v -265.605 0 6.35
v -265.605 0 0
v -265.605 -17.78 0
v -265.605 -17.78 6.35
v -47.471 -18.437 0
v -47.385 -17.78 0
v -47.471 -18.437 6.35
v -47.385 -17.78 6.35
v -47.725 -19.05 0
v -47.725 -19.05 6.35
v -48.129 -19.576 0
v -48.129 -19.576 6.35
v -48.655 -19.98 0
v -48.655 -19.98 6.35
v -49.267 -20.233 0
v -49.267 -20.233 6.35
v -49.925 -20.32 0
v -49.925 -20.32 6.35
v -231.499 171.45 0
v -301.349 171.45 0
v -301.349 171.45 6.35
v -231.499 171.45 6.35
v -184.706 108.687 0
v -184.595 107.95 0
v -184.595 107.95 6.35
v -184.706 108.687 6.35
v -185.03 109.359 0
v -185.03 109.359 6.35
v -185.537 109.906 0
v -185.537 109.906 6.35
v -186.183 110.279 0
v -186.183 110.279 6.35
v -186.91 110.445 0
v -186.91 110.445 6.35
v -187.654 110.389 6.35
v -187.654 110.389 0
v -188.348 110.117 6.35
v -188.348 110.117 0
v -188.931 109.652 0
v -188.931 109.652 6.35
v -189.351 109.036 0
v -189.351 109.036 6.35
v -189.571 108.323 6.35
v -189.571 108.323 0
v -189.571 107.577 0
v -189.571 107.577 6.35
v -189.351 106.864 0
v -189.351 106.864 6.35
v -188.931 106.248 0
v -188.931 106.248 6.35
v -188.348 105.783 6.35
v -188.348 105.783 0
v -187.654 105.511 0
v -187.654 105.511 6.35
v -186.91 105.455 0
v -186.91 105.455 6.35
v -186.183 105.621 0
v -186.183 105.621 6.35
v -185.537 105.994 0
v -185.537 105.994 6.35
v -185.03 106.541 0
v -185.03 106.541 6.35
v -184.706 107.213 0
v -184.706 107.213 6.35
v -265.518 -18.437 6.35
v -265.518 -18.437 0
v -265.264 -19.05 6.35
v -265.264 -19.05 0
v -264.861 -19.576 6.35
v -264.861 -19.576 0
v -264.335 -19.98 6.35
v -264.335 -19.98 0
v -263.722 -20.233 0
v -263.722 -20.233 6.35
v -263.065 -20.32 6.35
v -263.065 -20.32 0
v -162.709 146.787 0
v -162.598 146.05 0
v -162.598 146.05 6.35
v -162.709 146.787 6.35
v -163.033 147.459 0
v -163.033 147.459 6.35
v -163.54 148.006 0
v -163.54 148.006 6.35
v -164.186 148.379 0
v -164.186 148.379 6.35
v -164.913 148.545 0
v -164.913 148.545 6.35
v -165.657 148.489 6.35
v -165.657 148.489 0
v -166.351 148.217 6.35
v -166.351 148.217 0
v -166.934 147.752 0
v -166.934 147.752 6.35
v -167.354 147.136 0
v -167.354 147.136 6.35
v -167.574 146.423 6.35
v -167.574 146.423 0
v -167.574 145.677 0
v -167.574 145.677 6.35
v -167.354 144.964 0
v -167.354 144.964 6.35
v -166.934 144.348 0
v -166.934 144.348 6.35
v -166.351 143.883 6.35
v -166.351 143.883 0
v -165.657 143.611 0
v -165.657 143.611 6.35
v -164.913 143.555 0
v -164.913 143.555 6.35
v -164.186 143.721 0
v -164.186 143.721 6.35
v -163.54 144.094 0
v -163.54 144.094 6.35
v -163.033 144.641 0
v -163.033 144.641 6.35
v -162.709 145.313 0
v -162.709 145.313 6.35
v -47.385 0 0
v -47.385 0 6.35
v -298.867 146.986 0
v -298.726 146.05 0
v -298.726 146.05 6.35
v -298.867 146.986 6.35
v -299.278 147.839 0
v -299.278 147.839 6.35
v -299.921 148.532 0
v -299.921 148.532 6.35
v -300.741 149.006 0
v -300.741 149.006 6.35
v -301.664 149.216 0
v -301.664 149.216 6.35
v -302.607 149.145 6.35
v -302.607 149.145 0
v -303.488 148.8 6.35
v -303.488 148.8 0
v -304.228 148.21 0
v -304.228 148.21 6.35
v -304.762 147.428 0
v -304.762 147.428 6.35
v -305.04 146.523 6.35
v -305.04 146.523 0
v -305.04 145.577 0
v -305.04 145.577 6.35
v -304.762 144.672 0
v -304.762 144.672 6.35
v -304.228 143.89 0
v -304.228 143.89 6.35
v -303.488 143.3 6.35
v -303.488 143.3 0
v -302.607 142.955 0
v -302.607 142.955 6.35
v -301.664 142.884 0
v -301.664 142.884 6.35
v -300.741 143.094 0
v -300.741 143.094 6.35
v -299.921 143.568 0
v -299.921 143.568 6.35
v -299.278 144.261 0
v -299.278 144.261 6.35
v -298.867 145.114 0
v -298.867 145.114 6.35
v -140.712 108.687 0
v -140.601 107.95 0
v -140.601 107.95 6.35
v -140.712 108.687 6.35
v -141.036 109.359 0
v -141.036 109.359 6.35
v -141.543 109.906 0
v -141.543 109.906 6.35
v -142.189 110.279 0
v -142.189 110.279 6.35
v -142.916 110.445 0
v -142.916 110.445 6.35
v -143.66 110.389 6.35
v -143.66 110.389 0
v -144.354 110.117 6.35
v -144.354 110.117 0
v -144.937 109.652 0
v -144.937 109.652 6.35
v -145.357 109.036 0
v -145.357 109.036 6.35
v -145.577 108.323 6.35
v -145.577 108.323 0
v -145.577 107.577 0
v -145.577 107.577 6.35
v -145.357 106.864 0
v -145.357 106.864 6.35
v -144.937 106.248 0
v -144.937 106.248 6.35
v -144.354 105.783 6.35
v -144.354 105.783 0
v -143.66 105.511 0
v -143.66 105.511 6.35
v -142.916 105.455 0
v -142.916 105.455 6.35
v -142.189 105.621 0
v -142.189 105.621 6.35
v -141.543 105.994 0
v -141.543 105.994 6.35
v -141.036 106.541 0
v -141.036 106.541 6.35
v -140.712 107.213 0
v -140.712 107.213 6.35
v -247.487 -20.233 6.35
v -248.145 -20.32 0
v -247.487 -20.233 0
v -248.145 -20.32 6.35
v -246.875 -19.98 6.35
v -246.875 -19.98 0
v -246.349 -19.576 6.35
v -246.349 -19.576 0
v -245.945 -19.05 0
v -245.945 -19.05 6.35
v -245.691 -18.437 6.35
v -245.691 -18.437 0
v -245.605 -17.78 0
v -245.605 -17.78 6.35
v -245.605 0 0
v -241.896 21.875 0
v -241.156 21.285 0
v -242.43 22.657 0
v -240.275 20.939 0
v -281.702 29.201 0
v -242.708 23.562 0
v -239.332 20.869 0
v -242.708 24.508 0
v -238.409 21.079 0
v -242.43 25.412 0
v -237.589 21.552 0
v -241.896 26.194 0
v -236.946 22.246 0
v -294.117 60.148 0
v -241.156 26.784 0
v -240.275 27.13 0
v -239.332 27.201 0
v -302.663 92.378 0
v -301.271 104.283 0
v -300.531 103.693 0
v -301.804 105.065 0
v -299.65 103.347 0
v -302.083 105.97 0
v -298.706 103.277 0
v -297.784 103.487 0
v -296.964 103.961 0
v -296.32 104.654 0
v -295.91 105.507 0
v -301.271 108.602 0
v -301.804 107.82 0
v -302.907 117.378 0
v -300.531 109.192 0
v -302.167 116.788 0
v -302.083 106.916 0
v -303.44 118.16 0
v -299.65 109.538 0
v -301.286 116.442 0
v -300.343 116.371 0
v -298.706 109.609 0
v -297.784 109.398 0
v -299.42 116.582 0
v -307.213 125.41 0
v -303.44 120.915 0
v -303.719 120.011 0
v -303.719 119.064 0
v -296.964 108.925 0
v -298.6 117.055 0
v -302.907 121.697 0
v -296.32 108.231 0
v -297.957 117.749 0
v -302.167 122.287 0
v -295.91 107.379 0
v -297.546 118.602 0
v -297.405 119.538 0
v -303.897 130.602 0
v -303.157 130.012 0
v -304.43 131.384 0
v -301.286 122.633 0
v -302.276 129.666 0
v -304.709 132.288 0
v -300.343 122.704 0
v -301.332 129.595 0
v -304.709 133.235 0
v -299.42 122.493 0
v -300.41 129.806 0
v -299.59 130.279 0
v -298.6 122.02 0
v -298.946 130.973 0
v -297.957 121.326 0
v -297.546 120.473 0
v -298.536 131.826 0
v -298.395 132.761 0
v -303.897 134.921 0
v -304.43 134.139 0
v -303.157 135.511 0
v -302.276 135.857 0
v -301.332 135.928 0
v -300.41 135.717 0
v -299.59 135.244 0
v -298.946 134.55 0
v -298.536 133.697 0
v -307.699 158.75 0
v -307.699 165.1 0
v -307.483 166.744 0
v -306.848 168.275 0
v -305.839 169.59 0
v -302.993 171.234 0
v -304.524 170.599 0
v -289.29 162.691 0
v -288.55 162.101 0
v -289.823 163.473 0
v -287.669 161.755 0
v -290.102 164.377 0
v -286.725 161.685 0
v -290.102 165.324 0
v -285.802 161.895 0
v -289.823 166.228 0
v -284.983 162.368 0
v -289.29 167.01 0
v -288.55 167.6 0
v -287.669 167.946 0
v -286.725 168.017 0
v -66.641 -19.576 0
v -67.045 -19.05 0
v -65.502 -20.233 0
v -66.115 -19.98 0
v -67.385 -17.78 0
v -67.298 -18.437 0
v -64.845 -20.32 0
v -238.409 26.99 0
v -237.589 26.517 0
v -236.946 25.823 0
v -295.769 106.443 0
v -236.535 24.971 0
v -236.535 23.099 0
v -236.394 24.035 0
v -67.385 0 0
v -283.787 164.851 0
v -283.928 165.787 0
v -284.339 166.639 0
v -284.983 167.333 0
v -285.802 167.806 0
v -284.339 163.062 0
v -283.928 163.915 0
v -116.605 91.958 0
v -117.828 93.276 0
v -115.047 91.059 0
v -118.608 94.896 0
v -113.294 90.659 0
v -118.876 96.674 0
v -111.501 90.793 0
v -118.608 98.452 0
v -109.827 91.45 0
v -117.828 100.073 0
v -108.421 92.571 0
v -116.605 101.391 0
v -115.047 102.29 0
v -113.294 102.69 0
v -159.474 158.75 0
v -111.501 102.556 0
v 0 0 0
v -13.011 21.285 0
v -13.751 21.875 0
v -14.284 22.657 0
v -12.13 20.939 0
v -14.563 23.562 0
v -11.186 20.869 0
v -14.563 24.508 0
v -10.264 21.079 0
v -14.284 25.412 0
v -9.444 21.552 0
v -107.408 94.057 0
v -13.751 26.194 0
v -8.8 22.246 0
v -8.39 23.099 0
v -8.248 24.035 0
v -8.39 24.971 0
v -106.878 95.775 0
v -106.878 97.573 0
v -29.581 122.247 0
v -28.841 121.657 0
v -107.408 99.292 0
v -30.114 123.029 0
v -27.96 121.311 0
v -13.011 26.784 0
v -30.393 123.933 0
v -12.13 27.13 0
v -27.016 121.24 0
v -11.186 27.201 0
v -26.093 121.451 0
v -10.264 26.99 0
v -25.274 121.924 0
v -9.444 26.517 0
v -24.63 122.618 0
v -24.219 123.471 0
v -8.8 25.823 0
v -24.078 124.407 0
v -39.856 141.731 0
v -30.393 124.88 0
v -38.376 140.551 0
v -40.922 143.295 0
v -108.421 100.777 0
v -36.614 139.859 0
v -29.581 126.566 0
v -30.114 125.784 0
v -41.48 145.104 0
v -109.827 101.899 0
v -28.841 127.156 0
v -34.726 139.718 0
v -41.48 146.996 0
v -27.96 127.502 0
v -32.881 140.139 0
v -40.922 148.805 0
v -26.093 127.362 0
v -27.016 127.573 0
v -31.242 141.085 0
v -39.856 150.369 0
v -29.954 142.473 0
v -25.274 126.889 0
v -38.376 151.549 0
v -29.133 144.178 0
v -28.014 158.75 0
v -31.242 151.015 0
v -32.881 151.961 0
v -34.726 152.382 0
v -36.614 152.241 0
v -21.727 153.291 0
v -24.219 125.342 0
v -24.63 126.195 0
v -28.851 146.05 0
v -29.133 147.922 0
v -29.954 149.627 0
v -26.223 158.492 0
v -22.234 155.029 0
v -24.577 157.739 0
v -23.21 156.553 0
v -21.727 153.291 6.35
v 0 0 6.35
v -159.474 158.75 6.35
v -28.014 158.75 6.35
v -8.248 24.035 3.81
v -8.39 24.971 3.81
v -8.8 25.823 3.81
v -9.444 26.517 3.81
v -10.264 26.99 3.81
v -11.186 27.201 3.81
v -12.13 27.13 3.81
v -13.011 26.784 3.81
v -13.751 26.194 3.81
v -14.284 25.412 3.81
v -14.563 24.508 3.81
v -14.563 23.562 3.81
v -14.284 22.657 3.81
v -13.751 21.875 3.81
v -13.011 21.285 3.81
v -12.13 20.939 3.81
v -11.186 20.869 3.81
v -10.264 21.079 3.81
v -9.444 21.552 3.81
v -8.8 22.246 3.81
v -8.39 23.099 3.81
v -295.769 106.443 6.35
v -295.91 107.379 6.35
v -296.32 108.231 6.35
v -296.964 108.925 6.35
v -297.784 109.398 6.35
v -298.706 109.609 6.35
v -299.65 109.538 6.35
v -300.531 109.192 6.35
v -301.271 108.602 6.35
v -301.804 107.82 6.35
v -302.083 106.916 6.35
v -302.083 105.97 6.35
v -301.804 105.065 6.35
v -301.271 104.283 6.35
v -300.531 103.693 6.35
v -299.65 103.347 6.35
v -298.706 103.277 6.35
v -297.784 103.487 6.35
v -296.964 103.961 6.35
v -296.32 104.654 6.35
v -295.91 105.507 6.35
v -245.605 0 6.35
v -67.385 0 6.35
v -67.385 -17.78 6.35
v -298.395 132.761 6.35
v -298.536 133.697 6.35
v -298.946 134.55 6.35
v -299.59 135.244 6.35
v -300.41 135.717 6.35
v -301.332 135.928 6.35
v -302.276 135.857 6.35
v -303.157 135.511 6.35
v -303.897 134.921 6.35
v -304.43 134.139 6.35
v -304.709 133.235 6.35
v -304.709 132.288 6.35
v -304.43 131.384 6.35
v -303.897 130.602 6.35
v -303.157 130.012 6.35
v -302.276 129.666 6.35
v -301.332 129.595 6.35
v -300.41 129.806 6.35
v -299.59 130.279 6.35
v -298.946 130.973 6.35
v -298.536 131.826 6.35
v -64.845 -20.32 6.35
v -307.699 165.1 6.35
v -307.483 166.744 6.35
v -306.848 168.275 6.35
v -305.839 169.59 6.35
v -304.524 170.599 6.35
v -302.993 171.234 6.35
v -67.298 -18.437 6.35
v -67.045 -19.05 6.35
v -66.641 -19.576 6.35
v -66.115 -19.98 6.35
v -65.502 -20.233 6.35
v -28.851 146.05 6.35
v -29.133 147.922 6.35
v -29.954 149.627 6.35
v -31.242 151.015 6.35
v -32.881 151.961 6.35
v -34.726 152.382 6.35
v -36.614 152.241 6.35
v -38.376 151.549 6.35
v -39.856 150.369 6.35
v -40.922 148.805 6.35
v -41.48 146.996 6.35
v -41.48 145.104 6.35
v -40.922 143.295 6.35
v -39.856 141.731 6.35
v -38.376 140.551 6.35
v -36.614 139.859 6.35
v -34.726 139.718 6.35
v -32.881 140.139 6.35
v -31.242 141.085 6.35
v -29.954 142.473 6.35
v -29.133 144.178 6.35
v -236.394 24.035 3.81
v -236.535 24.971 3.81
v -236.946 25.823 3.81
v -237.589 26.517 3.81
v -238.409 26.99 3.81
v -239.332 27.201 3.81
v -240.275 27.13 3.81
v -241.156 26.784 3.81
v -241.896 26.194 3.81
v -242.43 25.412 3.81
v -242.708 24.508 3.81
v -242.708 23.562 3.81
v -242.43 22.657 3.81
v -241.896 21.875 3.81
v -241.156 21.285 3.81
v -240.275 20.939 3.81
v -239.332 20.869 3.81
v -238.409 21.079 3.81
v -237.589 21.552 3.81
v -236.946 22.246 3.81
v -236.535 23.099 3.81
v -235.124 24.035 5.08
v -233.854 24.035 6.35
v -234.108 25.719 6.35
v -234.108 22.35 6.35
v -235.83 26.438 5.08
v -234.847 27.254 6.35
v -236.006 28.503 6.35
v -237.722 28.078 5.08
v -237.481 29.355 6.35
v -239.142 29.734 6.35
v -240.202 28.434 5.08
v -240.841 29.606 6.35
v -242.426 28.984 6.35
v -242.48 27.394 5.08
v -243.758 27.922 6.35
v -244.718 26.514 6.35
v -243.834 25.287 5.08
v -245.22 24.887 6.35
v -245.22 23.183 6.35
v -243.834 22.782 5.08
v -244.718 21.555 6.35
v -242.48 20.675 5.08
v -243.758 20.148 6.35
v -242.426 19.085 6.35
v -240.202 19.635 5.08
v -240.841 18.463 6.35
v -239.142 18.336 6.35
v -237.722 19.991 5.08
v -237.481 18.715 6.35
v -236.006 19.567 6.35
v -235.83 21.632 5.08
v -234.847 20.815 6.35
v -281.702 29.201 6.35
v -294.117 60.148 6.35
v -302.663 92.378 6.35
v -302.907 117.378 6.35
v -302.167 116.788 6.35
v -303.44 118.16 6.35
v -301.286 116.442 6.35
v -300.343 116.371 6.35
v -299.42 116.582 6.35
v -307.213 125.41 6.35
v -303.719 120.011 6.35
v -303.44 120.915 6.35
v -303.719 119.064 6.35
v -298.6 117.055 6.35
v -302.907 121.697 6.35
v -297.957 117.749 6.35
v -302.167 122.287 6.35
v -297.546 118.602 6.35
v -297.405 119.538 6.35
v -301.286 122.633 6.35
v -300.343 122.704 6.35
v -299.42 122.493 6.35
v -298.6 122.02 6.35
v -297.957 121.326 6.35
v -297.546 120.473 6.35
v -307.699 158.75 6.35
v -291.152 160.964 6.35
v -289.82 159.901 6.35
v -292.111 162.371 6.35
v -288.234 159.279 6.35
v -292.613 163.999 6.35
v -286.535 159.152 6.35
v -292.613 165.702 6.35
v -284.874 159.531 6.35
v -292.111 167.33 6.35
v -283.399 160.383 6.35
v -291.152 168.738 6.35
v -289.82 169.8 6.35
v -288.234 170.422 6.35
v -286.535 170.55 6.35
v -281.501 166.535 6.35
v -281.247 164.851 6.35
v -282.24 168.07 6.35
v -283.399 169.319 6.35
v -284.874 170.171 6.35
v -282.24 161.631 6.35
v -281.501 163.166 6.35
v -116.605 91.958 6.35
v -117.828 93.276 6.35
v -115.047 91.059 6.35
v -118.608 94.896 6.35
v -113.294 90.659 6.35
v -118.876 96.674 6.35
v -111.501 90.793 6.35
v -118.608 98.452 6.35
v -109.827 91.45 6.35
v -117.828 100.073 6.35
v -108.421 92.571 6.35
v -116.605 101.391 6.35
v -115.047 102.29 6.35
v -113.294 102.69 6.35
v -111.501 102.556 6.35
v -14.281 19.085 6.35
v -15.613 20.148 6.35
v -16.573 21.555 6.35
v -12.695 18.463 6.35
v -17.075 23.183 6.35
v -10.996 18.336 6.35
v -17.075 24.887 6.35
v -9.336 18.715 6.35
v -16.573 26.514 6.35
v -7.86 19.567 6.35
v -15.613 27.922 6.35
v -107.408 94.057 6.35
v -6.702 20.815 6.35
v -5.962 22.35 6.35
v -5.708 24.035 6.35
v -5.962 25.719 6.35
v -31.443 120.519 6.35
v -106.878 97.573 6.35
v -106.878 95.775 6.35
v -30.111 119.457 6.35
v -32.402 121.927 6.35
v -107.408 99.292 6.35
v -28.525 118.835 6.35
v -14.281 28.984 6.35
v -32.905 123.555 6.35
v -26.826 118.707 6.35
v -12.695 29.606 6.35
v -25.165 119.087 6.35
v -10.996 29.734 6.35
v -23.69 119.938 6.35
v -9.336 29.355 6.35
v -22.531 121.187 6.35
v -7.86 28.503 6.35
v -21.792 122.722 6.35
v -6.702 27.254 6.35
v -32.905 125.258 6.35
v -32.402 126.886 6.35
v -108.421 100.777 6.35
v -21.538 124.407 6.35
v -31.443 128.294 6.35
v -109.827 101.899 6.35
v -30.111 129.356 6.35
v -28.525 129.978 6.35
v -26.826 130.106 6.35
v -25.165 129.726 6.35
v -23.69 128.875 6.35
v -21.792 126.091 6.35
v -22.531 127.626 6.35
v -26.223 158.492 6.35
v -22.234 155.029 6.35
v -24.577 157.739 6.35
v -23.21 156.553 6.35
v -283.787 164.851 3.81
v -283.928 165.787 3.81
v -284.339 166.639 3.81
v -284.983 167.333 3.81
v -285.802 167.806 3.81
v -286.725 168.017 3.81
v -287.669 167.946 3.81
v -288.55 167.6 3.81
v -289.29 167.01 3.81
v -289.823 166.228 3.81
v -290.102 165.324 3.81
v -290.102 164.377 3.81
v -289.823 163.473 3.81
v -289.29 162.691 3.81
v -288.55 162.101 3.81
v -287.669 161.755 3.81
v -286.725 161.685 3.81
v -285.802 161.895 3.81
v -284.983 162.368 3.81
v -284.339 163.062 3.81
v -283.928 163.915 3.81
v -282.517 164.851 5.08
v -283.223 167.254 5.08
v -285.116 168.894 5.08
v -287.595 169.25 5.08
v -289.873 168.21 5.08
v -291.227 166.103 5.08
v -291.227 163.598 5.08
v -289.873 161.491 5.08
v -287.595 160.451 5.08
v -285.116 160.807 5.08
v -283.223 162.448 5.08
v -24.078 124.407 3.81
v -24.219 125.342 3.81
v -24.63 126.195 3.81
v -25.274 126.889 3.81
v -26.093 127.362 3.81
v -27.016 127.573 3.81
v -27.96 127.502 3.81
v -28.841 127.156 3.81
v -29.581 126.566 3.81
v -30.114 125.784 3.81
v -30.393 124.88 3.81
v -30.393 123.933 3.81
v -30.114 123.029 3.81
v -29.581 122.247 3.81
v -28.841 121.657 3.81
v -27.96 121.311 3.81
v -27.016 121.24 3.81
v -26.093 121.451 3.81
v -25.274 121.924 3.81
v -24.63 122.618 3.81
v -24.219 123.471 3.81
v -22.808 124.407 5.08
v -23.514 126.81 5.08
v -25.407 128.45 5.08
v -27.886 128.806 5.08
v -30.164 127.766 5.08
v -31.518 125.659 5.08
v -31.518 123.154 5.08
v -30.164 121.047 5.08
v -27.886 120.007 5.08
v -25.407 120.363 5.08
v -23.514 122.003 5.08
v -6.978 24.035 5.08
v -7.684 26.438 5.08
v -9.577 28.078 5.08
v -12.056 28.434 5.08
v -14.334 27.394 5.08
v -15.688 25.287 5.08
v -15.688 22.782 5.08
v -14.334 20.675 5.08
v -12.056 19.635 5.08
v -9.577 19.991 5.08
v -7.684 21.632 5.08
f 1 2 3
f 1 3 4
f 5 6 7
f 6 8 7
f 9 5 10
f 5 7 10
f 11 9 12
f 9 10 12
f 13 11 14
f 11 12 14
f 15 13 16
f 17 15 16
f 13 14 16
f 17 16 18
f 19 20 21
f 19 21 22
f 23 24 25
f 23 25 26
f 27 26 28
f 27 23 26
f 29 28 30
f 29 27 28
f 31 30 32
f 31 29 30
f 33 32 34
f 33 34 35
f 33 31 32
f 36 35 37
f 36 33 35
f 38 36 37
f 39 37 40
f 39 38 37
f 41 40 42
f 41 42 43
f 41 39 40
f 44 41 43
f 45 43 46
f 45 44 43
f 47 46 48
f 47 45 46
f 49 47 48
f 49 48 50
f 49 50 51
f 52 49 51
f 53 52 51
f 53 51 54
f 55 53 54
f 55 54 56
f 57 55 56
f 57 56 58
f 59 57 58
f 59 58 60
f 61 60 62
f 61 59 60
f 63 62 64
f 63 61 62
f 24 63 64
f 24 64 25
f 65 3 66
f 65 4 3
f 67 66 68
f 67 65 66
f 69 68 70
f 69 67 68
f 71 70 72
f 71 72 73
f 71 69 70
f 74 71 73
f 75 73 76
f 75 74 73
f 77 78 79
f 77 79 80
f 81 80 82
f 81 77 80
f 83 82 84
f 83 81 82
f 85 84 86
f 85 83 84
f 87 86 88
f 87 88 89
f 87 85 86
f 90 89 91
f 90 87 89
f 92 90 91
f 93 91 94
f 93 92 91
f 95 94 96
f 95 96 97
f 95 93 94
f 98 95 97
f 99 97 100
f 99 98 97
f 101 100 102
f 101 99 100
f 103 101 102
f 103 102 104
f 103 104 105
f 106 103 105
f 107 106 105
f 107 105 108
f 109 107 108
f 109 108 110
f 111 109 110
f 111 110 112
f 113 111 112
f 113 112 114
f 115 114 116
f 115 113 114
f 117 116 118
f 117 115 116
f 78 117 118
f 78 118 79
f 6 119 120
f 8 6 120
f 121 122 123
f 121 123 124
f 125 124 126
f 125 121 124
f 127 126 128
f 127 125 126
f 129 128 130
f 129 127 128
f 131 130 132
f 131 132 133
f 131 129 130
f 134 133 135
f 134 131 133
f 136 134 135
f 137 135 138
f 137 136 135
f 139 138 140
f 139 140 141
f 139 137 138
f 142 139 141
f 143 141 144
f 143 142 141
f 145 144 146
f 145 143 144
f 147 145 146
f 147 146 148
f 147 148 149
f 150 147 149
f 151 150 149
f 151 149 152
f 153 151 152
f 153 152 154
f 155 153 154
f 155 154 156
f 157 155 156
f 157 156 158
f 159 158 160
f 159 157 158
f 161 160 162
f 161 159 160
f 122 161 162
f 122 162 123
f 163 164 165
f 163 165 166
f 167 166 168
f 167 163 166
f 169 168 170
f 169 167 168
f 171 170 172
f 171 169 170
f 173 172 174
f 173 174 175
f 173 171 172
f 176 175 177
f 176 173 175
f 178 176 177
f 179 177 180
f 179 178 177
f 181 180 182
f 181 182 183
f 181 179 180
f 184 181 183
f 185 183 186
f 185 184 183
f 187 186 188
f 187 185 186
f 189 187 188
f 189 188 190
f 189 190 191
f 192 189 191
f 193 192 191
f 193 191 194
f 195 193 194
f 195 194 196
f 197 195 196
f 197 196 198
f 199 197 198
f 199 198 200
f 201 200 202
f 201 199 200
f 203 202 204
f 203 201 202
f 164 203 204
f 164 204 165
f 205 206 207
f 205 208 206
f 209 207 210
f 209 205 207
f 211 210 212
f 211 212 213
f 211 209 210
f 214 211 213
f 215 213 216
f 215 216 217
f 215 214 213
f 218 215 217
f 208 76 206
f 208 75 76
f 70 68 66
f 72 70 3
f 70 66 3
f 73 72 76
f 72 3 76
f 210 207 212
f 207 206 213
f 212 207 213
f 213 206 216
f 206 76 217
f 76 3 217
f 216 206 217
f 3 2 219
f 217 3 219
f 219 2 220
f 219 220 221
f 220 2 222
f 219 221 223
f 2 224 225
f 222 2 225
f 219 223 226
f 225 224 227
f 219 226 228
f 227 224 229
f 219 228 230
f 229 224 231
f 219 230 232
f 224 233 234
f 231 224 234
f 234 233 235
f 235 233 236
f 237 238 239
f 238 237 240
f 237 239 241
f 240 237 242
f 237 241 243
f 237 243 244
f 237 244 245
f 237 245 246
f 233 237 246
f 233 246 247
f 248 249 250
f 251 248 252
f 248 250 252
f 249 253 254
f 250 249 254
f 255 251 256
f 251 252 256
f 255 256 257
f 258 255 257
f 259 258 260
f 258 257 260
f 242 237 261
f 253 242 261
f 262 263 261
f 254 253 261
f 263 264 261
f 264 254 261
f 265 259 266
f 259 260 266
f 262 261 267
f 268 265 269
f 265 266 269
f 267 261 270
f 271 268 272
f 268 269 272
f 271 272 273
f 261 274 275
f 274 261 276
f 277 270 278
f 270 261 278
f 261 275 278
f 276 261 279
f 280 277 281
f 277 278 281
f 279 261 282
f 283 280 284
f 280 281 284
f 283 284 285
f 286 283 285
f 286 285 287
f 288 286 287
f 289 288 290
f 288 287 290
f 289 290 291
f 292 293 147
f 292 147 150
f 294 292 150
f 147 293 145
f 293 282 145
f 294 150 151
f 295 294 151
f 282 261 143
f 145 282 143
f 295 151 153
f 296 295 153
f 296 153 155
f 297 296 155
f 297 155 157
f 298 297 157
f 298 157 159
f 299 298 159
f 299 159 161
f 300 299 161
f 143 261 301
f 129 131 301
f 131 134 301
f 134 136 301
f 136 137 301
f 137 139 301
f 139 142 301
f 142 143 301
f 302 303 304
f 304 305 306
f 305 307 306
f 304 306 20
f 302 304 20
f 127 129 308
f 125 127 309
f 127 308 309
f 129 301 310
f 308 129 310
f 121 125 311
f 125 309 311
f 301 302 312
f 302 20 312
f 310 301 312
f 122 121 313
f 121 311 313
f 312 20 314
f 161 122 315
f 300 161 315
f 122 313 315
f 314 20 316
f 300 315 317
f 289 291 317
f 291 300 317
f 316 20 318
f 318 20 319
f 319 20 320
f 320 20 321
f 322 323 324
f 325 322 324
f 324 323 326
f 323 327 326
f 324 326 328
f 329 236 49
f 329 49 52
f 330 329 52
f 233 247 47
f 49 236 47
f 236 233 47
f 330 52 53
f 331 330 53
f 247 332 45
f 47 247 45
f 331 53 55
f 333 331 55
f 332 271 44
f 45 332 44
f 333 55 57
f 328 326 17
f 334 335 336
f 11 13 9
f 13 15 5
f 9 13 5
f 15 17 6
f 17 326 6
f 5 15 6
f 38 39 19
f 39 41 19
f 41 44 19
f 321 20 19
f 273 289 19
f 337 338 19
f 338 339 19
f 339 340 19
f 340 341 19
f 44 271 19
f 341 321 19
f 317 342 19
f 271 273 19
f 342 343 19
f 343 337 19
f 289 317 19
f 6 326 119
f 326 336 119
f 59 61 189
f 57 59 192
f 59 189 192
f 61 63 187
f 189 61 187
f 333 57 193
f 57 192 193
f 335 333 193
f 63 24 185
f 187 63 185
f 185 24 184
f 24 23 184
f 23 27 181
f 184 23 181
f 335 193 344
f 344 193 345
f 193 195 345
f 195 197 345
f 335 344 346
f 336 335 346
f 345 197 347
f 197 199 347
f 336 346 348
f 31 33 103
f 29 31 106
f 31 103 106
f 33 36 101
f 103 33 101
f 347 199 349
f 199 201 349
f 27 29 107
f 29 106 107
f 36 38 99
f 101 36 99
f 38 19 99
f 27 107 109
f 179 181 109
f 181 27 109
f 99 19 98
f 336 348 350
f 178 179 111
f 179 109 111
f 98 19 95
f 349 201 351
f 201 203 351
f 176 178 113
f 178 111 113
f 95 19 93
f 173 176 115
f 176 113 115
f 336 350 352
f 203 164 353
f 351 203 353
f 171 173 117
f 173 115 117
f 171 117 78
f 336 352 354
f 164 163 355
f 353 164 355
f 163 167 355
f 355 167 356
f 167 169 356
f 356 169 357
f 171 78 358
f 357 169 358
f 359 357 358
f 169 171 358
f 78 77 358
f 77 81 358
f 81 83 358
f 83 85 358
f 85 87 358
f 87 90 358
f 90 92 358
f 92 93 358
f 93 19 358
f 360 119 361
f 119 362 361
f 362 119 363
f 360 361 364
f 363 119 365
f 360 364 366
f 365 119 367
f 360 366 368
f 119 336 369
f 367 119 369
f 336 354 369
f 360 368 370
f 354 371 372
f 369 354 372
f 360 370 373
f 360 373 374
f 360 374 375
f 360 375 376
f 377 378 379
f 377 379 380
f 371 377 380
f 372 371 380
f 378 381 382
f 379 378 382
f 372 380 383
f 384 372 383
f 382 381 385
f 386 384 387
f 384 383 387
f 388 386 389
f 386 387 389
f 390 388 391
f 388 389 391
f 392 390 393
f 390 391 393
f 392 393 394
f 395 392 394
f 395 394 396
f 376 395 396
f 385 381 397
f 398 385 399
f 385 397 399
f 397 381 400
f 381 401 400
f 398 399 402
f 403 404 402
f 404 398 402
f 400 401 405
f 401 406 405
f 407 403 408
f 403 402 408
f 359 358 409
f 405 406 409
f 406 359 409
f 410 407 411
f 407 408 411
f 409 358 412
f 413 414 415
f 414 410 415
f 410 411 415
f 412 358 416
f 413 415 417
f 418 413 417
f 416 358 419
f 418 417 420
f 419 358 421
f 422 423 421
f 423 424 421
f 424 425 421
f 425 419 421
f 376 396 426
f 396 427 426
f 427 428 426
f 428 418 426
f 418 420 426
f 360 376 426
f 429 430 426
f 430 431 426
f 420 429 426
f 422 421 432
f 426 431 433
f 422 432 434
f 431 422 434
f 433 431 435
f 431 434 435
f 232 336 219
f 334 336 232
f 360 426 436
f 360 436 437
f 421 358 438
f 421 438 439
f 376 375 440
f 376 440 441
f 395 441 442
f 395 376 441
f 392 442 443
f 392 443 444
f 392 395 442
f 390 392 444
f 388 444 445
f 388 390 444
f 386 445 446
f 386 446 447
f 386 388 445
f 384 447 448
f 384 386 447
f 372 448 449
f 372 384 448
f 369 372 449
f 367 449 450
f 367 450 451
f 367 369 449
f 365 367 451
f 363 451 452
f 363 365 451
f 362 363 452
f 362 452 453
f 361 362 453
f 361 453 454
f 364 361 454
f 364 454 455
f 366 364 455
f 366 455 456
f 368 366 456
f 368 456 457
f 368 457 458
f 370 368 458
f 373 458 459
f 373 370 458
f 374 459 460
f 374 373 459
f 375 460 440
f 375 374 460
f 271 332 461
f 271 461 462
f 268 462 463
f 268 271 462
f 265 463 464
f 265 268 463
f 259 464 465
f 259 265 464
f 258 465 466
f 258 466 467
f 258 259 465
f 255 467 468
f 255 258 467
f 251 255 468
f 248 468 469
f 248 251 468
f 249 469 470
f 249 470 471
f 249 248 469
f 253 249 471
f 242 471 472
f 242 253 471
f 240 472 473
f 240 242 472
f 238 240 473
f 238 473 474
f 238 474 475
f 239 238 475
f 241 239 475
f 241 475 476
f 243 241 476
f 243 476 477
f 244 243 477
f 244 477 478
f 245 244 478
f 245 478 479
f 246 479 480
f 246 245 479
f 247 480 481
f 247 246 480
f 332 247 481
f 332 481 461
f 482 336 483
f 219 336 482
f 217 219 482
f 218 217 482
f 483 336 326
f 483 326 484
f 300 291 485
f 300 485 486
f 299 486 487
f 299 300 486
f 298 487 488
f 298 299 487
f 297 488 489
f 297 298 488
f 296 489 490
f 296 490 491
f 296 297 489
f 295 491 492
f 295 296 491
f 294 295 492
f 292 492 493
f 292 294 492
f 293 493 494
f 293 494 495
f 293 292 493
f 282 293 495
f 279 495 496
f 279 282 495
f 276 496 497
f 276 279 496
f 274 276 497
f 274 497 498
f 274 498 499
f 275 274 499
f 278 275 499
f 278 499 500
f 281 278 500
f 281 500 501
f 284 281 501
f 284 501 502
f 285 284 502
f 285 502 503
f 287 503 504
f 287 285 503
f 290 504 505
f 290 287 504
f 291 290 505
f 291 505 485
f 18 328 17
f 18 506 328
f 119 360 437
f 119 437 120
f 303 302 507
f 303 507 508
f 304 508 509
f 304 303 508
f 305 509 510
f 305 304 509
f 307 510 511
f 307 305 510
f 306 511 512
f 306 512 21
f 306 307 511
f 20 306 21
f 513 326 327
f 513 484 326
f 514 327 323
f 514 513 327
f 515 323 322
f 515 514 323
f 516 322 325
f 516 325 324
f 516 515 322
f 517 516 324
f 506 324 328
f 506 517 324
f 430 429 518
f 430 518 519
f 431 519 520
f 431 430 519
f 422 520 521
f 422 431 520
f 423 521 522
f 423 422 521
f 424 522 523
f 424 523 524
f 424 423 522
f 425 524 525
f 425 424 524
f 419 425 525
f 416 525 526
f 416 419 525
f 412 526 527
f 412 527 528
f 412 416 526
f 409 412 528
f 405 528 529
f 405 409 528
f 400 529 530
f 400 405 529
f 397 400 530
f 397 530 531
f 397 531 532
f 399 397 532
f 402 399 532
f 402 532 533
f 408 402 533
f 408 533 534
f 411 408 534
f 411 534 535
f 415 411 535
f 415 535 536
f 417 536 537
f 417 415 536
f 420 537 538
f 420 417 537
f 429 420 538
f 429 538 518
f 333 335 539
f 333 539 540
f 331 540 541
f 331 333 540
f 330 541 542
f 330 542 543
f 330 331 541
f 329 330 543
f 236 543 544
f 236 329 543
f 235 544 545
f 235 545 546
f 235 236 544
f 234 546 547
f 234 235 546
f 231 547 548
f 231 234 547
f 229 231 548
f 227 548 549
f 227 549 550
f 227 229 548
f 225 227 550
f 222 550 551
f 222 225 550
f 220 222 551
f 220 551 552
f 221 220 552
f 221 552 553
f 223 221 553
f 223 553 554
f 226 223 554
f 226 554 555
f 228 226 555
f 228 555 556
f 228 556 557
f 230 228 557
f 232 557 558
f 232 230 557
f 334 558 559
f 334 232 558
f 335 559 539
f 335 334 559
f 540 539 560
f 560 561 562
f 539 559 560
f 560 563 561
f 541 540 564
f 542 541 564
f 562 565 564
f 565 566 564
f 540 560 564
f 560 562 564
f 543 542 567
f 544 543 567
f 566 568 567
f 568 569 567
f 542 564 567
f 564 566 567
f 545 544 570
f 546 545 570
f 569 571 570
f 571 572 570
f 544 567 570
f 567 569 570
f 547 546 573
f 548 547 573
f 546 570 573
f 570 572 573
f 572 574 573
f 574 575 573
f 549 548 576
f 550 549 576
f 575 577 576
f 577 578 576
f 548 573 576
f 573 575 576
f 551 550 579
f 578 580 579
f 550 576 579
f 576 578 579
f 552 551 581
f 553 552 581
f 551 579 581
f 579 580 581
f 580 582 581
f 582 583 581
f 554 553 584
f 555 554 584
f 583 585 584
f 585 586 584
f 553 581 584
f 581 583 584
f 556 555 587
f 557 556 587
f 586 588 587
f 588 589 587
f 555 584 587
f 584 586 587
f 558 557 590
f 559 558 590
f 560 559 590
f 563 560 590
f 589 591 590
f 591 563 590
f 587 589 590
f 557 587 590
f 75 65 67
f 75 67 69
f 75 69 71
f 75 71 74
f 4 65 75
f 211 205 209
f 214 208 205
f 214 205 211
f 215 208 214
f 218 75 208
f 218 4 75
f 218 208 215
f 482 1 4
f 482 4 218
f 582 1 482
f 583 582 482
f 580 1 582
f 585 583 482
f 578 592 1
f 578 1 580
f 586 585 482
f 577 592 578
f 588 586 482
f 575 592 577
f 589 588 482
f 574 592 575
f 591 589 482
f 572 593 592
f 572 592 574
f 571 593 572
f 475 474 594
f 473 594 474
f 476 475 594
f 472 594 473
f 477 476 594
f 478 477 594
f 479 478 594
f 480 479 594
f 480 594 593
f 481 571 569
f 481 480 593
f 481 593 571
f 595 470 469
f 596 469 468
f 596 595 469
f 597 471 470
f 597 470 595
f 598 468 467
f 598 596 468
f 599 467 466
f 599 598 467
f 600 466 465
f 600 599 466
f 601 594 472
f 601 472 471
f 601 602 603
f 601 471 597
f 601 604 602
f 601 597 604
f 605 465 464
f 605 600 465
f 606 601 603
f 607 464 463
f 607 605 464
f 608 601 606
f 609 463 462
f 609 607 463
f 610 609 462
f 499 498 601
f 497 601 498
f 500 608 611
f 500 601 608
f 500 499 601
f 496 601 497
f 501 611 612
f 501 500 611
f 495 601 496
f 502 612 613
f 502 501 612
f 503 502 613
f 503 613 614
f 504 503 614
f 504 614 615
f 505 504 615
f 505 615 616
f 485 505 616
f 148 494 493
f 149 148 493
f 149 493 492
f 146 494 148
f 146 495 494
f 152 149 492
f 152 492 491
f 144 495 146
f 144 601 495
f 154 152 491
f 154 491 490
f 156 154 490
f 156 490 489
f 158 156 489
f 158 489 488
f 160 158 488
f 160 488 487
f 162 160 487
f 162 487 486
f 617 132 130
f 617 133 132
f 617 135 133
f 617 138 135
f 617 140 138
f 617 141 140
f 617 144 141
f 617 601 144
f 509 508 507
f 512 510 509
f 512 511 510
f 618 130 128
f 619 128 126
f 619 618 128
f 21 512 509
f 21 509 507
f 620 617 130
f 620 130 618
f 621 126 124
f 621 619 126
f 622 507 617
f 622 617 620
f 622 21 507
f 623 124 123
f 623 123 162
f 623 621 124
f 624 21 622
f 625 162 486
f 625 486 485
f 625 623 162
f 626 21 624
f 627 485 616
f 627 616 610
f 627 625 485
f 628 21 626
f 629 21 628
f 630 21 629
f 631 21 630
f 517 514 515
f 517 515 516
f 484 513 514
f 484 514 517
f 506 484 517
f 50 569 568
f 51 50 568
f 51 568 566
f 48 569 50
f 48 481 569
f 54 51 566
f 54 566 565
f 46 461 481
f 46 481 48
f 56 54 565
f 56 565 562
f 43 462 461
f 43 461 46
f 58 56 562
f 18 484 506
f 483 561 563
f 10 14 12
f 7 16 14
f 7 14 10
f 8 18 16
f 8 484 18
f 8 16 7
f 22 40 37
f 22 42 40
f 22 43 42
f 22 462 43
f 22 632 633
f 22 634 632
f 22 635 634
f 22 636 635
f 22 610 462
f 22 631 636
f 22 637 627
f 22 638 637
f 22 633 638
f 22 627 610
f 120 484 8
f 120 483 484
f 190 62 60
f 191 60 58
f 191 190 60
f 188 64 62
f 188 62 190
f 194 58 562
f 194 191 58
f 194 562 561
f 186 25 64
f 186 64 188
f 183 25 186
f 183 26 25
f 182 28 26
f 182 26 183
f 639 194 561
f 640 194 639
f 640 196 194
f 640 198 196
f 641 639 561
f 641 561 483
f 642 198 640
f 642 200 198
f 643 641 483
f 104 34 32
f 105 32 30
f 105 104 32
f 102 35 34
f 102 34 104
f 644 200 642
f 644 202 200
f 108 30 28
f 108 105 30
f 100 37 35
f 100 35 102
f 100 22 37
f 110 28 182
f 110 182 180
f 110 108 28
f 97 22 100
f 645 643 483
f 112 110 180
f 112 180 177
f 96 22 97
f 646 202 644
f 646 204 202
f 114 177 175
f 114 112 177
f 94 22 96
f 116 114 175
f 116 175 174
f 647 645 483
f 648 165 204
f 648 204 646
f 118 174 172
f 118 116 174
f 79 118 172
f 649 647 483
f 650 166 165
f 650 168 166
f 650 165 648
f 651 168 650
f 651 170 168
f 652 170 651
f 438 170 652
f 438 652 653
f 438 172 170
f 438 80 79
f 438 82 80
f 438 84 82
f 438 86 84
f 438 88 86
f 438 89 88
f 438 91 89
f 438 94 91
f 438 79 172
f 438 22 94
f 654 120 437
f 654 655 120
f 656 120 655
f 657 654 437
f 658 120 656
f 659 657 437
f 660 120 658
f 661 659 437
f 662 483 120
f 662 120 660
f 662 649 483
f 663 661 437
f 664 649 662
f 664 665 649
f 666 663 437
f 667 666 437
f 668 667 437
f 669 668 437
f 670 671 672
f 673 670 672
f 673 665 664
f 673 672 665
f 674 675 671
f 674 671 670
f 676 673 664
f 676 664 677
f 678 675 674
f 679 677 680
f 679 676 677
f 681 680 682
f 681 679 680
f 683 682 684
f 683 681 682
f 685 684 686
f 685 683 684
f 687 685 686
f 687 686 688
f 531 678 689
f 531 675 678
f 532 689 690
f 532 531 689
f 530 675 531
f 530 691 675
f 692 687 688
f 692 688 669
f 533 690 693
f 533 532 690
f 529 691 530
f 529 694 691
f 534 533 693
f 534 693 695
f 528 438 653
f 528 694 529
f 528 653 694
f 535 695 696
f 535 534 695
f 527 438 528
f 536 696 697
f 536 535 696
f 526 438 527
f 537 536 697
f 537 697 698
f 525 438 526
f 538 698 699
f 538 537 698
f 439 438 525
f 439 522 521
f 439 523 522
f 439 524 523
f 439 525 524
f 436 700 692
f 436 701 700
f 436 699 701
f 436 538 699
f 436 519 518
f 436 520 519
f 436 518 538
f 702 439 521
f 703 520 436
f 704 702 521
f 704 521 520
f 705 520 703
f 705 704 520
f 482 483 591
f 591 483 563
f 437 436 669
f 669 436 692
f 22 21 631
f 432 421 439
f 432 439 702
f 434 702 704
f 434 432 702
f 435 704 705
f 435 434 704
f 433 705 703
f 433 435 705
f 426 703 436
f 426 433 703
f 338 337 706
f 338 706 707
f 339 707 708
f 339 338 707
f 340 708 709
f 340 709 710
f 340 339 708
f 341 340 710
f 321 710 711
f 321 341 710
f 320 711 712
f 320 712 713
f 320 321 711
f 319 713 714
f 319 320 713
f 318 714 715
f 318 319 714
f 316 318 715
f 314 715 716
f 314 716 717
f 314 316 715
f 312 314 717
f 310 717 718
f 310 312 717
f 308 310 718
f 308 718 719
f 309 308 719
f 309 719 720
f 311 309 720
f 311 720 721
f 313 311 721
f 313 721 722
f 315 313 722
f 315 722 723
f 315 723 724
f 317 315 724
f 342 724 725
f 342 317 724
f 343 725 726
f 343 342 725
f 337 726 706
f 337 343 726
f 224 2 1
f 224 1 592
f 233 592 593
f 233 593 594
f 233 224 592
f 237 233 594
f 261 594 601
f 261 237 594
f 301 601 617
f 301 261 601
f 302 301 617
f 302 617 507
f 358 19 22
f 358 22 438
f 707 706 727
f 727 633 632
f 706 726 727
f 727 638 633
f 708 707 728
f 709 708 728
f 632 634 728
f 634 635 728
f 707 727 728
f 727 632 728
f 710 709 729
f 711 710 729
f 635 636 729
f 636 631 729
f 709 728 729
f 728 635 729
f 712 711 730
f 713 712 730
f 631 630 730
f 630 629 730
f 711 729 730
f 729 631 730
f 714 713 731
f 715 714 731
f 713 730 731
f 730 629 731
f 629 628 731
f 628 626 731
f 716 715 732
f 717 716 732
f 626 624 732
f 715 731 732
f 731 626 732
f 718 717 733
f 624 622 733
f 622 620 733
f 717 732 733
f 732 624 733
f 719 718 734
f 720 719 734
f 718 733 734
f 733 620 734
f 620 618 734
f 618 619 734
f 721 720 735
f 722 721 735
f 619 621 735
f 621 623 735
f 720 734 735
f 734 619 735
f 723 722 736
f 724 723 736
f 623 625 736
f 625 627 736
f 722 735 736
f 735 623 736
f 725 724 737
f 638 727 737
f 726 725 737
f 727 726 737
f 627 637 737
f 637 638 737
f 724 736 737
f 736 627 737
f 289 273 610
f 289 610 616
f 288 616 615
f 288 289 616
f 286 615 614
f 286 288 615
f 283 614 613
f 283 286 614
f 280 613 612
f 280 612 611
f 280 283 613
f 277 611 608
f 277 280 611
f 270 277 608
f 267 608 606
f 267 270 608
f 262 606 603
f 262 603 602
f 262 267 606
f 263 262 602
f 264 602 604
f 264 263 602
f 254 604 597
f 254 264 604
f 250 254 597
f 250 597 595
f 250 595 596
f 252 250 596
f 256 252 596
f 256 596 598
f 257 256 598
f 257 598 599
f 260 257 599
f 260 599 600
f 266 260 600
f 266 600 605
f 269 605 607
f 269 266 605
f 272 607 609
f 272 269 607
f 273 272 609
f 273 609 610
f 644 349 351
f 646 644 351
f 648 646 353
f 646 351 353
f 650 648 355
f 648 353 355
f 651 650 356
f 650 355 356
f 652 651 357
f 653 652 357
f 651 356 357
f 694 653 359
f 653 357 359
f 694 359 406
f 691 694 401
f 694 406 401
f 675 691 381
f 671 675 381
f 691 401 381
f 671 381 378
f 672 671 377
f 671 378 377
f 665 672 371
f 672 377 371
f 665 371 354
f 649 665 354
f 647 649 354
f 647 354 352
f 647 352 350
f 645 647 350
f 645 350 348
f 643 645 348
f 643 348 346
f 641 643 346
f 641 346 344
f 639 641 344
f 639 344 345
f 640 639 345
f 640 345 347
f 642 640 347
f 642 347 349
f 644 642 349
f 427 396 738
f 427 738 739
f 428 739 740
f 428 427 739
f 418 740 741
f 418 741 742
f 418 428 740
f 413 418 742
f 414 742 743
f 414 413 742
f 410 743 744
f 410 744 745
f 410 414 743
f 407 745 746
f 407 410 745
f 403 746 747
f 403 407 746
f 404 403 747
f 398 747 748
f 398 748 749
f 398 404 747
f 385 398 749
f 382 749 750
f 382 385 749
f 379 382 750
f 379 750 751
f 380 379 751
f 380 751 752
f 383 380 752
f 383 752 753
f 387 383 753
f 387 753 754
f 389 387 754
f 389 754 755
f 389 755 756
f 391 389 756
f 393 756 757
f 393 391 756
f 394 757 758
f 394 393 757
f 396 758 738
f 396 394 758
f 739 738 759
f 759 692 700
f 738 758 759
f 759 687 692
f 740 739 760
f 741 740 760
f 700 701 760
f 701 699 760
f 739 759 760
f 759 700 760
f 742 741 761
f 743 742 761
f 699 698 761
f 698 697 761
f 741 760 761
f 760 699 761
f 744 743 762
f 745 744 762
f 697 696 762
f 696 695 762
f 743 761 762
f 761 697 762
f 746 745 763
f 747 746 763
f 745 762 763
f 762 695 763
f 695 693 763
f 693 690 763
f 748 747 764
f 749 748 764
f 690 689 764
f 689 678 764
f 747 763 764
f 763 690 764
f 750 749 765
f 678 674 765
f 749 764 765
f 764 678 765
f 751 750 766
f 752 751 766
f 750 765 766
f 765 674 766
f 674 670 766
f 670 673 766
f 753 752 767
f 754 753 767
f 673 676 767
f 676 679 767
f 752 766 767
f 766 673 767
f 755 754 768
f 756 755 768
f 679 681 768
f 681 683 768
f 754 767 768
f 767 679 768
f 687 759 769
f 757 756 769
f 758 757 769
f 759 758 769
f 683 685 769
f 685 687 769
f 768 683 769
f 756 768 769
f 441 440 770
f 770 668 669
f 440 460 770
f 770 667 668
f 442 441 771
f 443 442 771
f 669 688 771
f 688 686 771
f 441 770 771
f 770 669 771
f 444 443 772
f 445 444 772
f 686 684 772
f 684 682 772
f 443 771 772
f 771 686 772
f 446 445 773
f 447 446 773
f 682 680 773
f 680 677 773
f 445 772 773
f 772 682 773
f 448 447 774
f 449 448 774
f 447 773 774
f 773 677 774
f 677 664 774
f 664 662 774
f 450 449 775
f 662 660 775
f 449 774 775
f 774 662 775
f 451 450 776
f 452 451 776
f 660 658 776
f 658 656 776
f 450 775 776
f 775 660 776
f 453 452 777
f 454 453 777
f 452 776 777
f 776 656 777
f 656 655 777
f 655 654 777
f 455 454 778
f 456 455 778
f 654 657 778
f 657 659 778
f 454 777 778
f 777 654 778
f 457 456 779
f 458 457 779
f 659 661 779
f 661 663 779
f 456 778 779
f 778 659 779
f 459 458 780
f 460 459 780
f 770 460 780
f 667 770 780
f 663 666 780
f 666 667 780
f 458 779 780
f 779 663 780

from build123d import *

# Parameters (mm, degrees)
SKETCH18_R          = 3.175
SKETCH18_R_2        = 6.35
SKETCH18_R_3        = 2.5019
BOSS_EXTRUDE4_DEPTH = 6.35
CHAMFER1_SIZE       = 2.54
SKETCH19_R          = 6.0325
CUT_EXTRUDE1_DEPTH  = 43.434
SKETCH20_W          = 20
SKETCH20_H          = 6.35
BOSS_EXTRUDE5_DEPTH = 20.32
FILLET1_R           = 2.54


with BuildPart() as part:
    # Sketch18 → Boss-Extrude4 (new body)
    with BuildSketch(Plane.XY):
        with BuildLine():
            Line((0, 0), (-265.604745697, 0))
            ThreePointArc((-265.604745697, 0), (-298.882523776, 76.131915965), (-307.699061234, 158.75))
            Line((-307.699061234, 158.75), (-307.699061234, 165.1))
            ThreePointArc((-307.699061234, 165.1), (-305.839189294, 169.590128061), (-301.349061234, 171.45))
            Line((-301.349061234, 171.45), (-231.499061234, 171.45))
            Line((-231.499061234, 171.45), (-159.473782125, 158.75))
            Line((-159.473782125, 158.75), (-28.014368889, 158.75))
            ThreePointArc((-28.014368889, 158.75), (-23.851207857, 157.194850386), (-21.727208485, 153.291130779))
            Line((-21.727208485, 153.291130779), (0, 0))
        make_face()
        with Locations((-11.423473622, 24.034728138)):
            Circle(SKETCH18_R, mode=Mode.SUBTRACT)
        with Locations((-27.253356194, 124.406511892)):
            Circle(SKETCH18_R, mode=Mode.SUBTRACT)
        with Locations((-35.200938766, 146.05)):
            Circle(SKETCH18_R_2, mode=Mode.SUBTRACT)
        with Locations((-301.900938766, 146.05)):
            Circle(SKETCH18_R, mode=Mode.SUBTRACT)
        with Locations((-301.569673588, 132.761391752)):
            Circle(SKETCH18_R, mode=Mode.SUBTRACT)
        with Locations((-300.579872803, 119.537524267)):
            Circle(SKETCH18_R, mode=Mode.SUBTRACT)
        with Locations((-298.943543444, 106.442822899)):
            Circle(SKETCH18_R, mode=Mode.SUBTRACT)
        with Locations((-239.568937637, 24.034728138)):
            Circle(SKETCH18_R, mode=Mode.SUBTRACT)
        with Locations((-286.962142025, 164.850708953)):
            Circle(SKETCH18_R, mode=Mode.SUBTRACT)
        with Locations((-165.1, 146.05)):
            Circle(SKETCH18_R_3, mode=Mode.SUBTRACT)
        with Locations((-143.102954744, 107.95)):
            Circle(SKETCH18_R_3, mode=Mode.SUBTRACT)
        with Locations((-187.097045256, 107.95)):
            Circle(SKETCH18_R_3, mode=Mode.SUBTRACT)
    extrude(amount=BOSS_EXTRUDE4_DEPTH)

    # Chamfer1
    chamfer1_edges = [part.edges().sort_by_distance(p)[0] for p in [
        (-14.598473622, 24.034728138, 6.35),
        (-30.428356194, 124.406511892, 6.35),
        (-242.743937637, 24.034728138, 6.35),
        (-290.137142025, 164.850708953, 6.35),
    ]]
    chamfer(chamfer1_edges, length=CHAMFER1_SIZE)

    # Sketch19 → Cut-Extrude1 (cut)
    with BuildSketch(Plane(origin=(0, 0, 0), x_dir=(-1, 0, 0), z_dir=(0, 0, -1))):
        with Locations((112.843509564, 96.674296134)):
            Circle(SKETCH19_R)
    extrude(amount=-CUT_EXTRUDE1_DEPTH, mode=Mode.SUBTRACT)

    # Sketch20 → Boss-Extrude5 (add)
    with BuildSketch(Plane.XZ):
        with Locations((-255.604745697, 3.175)):
            Rectangle(SKETCH20_W, SKETCH20_H)
        with Locations((-57.384832148, 3.175)):
            Rectangle(SKETCH20_W, SKETCH20_H)
    extrude(amount=BOSS_EXTRUDE5_DEPTH)

    # Fillet1
    fillet1_edges = [part.edges().sort_by_distance(p)[0] for p in [
        (-265.604745697, -20.32, 3.175),
        (-245.604745697, -20.32, 3.175),
        (-47.384832148, -20.32, 3.175),
        (-67.384832148, -20.32, 3.175),
    ]]
    fillet(fillet1_edges, radius=FILLET1_R)


solid = part.part
